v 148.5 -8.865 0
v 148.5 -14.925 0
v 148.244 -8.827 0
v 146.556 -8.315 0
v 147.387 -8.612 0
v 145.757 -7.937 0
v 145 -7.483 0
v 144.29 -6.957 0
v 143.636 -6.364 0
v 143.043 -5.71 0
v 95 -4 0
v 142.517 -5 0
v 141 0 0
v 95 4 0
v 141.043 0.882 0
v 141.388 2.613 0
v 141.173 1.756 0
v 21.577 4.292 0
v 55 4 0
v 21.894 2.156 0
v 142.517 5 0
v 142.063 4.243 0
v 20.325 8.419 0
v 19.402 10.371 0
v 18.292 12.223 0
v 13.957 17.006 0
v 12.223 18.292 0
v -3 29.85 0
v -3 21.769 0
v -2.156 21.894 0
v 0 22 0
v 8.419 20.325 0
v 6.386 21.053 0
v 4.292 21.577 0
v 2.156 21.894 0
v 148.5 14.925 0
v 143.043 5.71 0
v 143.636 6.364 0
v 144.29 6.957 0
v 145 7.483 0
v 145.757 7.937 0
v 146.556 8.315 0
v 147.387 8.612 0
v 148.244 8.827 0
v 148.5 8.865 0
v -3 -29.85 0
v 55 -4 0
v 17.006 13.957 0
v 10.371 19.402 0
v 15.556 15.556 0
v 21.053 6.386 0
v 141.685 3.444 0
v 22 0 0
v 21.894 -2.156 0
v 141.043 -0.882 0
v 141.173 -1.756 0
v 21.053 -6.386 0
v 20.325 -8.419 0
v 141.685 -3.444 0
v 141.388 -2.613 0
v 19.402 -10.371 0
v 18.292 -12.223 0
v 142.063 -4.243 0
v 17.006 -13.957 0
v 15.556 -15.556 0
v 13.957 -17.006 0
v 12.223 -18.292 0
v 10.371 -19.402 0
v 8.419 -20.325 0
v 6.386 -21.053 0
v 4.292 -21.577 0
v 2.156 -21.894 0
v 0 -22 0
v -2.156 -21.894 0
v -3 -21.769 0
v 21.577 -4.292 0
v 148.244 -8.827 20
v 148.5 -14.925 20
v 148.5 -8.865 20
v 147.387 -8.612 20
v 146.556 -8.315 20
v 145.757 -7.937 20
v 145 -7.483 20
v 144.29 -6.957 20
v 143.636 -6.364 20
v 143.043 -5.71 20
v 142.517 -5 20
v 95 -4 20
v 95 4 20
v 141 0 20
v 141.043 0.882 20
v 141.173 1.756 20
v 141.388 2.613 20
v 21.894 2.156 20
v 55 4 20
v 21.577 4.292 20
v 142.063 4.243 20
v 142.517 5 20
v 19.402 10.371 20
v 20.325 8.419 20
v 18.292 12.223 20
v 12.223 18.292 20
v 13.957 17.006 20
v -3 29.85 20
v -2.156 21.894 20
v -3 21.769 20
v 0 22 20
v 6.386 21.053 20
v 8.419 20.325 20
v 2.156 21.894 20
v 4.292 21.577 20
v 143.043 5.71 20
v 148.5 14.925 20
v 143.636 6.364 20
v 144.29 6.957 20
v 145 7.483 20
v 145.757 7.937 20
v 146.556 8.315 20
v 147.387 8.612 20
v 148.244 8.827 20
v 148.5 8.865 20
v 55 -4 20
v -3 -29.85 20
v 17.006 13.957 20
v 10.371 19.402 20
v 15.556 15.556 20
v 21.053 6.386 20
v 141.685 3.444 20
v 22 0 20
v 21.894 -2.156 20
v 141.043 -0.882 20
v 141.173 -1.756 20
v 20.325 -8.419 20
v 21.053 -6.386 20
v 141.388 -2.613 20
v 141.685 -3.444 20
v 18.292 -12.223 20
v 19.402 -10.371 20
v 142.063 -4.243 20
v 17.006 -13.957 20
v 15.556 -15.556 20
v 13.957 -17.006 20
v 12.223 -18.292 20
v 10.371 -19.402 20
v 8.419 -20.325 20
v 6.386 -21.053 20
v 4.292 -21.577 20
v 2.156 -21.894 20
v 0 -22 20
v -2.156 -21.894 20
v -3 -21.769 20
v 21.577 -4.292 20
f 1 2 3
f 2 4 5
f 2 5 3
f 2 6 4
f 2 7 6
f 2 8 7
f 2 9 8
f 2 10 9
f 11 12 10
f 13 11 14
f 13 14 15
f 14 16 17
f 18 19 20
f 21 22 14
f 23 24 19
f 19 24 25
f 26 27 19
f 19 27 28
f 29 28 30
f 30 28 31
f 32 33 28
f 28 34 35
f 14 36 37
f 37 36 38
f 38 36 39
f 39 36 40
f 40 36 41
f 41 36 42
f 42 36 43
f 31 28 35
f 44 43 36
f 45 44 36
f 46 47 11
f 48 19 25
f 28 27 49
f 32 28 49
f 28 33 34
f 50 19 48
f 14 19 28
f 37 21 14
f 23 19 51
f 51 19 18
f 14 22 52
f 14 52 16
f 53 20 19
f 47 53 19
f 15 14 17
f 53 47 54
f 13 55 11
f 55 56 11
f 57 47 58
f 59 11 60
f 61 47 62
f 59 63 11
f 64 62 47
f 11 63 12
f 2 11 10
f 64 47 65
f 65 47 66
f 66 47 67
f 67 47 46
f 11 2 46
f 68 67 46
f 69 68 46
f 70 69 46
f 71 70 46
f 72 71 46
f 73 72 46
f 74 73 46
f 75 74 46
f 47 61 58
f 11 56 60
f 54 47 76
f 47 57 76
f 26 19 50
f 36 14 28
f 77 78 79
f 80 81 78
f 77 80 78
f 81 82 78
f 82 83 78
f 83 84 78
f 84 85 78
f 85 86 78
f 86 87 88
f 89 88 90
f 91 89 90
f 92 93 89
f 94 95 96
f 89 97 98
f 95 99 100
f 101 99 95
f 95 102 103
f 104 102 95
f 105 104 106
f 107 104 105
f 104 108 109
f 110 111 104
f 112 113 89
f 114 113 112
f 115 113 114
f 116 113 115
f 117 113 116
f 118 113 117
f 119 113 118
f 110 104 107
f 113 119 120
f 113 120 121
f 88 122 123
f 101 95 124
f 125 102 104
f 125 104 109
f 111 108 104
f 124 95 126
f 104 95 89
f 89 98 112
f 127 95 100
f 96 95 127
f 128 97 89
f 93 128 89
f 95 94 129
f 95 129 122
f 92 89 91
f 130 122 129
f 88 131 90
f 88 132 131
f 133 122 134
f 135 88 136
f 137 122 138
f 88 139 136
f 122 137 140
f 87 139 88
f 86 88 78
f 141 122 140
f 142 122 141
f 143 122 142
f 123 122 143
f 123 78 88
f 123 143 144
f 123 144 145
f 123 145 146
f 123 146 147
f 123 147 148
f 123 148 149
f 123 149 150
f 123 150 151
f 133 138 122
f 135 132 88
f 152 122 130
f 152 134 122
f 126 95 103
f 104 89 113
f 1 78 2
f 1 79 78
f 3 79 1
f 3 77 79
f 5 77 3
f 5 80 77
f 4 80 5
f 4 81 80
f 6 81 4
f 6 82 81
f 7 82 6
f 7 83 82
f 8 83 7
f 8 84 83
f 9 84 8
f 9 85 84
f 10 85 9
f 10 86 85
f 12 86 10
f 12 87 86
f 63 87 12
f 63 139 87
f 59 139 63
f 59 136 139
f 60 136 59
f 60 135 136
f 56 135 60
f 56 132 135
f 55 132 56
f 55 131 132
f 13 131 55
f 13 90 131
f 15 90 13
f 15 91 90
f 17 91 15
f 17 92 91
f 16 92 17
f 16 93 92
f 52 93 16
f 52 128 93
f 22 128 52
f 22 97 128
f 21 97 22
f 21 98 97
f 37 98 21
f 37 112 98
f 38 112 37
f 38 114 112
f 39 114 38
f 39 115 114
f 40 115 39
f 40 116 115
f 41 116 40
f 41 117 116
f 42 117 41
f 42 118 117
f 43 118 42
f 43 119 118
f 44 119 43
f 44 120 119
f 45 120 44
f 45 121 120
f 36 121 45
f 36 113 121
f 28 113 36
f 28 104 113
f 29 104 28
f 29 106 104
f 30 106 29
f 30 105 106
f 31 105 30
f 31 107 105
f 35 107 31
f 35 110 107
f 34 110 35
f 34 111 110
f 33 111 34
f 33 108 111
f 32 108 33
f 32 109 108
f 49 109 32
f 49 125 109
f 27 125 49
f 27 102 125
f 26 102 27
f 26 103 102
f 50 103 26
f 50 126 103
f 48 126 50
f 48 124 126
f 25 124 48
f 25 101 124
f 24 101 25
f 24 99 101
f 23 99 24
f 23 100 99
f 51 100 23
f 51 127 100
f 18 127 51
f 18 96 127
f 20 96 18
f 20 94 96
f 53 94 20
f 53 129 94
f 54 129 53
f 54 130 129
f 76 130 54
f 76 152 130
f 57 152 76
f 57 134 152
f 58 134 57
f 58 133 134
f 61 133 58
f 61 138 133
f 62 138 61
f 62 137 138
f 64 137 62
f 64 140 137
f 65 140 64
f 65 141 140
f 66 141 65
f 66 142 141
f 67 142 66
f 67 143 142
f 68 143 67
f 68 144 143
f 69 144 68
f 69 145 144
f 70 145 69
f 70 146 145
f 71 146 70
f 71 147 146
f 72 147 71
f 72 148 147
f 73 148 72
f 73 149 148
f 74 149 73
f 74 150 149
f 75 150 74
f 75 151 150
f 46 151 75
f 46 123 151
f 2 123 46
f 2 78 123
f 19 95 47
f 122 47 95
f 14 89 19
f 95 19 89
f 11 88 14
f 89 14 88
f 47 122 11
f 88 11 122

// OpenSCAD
linear_extrude(height = 20)
  difference() {
    polygon([[-3,-29.85],[148.5,-14.925],[148.5,14.925],[-3,29.85]]);
    translate([0,0]) circle(r = 22, $fn = 64);
    translate([150,0]) circle(r = 9, $fn = 64);
    polygon([[55,-4],[95,-4],[95,4],[55,4]]);
  }
